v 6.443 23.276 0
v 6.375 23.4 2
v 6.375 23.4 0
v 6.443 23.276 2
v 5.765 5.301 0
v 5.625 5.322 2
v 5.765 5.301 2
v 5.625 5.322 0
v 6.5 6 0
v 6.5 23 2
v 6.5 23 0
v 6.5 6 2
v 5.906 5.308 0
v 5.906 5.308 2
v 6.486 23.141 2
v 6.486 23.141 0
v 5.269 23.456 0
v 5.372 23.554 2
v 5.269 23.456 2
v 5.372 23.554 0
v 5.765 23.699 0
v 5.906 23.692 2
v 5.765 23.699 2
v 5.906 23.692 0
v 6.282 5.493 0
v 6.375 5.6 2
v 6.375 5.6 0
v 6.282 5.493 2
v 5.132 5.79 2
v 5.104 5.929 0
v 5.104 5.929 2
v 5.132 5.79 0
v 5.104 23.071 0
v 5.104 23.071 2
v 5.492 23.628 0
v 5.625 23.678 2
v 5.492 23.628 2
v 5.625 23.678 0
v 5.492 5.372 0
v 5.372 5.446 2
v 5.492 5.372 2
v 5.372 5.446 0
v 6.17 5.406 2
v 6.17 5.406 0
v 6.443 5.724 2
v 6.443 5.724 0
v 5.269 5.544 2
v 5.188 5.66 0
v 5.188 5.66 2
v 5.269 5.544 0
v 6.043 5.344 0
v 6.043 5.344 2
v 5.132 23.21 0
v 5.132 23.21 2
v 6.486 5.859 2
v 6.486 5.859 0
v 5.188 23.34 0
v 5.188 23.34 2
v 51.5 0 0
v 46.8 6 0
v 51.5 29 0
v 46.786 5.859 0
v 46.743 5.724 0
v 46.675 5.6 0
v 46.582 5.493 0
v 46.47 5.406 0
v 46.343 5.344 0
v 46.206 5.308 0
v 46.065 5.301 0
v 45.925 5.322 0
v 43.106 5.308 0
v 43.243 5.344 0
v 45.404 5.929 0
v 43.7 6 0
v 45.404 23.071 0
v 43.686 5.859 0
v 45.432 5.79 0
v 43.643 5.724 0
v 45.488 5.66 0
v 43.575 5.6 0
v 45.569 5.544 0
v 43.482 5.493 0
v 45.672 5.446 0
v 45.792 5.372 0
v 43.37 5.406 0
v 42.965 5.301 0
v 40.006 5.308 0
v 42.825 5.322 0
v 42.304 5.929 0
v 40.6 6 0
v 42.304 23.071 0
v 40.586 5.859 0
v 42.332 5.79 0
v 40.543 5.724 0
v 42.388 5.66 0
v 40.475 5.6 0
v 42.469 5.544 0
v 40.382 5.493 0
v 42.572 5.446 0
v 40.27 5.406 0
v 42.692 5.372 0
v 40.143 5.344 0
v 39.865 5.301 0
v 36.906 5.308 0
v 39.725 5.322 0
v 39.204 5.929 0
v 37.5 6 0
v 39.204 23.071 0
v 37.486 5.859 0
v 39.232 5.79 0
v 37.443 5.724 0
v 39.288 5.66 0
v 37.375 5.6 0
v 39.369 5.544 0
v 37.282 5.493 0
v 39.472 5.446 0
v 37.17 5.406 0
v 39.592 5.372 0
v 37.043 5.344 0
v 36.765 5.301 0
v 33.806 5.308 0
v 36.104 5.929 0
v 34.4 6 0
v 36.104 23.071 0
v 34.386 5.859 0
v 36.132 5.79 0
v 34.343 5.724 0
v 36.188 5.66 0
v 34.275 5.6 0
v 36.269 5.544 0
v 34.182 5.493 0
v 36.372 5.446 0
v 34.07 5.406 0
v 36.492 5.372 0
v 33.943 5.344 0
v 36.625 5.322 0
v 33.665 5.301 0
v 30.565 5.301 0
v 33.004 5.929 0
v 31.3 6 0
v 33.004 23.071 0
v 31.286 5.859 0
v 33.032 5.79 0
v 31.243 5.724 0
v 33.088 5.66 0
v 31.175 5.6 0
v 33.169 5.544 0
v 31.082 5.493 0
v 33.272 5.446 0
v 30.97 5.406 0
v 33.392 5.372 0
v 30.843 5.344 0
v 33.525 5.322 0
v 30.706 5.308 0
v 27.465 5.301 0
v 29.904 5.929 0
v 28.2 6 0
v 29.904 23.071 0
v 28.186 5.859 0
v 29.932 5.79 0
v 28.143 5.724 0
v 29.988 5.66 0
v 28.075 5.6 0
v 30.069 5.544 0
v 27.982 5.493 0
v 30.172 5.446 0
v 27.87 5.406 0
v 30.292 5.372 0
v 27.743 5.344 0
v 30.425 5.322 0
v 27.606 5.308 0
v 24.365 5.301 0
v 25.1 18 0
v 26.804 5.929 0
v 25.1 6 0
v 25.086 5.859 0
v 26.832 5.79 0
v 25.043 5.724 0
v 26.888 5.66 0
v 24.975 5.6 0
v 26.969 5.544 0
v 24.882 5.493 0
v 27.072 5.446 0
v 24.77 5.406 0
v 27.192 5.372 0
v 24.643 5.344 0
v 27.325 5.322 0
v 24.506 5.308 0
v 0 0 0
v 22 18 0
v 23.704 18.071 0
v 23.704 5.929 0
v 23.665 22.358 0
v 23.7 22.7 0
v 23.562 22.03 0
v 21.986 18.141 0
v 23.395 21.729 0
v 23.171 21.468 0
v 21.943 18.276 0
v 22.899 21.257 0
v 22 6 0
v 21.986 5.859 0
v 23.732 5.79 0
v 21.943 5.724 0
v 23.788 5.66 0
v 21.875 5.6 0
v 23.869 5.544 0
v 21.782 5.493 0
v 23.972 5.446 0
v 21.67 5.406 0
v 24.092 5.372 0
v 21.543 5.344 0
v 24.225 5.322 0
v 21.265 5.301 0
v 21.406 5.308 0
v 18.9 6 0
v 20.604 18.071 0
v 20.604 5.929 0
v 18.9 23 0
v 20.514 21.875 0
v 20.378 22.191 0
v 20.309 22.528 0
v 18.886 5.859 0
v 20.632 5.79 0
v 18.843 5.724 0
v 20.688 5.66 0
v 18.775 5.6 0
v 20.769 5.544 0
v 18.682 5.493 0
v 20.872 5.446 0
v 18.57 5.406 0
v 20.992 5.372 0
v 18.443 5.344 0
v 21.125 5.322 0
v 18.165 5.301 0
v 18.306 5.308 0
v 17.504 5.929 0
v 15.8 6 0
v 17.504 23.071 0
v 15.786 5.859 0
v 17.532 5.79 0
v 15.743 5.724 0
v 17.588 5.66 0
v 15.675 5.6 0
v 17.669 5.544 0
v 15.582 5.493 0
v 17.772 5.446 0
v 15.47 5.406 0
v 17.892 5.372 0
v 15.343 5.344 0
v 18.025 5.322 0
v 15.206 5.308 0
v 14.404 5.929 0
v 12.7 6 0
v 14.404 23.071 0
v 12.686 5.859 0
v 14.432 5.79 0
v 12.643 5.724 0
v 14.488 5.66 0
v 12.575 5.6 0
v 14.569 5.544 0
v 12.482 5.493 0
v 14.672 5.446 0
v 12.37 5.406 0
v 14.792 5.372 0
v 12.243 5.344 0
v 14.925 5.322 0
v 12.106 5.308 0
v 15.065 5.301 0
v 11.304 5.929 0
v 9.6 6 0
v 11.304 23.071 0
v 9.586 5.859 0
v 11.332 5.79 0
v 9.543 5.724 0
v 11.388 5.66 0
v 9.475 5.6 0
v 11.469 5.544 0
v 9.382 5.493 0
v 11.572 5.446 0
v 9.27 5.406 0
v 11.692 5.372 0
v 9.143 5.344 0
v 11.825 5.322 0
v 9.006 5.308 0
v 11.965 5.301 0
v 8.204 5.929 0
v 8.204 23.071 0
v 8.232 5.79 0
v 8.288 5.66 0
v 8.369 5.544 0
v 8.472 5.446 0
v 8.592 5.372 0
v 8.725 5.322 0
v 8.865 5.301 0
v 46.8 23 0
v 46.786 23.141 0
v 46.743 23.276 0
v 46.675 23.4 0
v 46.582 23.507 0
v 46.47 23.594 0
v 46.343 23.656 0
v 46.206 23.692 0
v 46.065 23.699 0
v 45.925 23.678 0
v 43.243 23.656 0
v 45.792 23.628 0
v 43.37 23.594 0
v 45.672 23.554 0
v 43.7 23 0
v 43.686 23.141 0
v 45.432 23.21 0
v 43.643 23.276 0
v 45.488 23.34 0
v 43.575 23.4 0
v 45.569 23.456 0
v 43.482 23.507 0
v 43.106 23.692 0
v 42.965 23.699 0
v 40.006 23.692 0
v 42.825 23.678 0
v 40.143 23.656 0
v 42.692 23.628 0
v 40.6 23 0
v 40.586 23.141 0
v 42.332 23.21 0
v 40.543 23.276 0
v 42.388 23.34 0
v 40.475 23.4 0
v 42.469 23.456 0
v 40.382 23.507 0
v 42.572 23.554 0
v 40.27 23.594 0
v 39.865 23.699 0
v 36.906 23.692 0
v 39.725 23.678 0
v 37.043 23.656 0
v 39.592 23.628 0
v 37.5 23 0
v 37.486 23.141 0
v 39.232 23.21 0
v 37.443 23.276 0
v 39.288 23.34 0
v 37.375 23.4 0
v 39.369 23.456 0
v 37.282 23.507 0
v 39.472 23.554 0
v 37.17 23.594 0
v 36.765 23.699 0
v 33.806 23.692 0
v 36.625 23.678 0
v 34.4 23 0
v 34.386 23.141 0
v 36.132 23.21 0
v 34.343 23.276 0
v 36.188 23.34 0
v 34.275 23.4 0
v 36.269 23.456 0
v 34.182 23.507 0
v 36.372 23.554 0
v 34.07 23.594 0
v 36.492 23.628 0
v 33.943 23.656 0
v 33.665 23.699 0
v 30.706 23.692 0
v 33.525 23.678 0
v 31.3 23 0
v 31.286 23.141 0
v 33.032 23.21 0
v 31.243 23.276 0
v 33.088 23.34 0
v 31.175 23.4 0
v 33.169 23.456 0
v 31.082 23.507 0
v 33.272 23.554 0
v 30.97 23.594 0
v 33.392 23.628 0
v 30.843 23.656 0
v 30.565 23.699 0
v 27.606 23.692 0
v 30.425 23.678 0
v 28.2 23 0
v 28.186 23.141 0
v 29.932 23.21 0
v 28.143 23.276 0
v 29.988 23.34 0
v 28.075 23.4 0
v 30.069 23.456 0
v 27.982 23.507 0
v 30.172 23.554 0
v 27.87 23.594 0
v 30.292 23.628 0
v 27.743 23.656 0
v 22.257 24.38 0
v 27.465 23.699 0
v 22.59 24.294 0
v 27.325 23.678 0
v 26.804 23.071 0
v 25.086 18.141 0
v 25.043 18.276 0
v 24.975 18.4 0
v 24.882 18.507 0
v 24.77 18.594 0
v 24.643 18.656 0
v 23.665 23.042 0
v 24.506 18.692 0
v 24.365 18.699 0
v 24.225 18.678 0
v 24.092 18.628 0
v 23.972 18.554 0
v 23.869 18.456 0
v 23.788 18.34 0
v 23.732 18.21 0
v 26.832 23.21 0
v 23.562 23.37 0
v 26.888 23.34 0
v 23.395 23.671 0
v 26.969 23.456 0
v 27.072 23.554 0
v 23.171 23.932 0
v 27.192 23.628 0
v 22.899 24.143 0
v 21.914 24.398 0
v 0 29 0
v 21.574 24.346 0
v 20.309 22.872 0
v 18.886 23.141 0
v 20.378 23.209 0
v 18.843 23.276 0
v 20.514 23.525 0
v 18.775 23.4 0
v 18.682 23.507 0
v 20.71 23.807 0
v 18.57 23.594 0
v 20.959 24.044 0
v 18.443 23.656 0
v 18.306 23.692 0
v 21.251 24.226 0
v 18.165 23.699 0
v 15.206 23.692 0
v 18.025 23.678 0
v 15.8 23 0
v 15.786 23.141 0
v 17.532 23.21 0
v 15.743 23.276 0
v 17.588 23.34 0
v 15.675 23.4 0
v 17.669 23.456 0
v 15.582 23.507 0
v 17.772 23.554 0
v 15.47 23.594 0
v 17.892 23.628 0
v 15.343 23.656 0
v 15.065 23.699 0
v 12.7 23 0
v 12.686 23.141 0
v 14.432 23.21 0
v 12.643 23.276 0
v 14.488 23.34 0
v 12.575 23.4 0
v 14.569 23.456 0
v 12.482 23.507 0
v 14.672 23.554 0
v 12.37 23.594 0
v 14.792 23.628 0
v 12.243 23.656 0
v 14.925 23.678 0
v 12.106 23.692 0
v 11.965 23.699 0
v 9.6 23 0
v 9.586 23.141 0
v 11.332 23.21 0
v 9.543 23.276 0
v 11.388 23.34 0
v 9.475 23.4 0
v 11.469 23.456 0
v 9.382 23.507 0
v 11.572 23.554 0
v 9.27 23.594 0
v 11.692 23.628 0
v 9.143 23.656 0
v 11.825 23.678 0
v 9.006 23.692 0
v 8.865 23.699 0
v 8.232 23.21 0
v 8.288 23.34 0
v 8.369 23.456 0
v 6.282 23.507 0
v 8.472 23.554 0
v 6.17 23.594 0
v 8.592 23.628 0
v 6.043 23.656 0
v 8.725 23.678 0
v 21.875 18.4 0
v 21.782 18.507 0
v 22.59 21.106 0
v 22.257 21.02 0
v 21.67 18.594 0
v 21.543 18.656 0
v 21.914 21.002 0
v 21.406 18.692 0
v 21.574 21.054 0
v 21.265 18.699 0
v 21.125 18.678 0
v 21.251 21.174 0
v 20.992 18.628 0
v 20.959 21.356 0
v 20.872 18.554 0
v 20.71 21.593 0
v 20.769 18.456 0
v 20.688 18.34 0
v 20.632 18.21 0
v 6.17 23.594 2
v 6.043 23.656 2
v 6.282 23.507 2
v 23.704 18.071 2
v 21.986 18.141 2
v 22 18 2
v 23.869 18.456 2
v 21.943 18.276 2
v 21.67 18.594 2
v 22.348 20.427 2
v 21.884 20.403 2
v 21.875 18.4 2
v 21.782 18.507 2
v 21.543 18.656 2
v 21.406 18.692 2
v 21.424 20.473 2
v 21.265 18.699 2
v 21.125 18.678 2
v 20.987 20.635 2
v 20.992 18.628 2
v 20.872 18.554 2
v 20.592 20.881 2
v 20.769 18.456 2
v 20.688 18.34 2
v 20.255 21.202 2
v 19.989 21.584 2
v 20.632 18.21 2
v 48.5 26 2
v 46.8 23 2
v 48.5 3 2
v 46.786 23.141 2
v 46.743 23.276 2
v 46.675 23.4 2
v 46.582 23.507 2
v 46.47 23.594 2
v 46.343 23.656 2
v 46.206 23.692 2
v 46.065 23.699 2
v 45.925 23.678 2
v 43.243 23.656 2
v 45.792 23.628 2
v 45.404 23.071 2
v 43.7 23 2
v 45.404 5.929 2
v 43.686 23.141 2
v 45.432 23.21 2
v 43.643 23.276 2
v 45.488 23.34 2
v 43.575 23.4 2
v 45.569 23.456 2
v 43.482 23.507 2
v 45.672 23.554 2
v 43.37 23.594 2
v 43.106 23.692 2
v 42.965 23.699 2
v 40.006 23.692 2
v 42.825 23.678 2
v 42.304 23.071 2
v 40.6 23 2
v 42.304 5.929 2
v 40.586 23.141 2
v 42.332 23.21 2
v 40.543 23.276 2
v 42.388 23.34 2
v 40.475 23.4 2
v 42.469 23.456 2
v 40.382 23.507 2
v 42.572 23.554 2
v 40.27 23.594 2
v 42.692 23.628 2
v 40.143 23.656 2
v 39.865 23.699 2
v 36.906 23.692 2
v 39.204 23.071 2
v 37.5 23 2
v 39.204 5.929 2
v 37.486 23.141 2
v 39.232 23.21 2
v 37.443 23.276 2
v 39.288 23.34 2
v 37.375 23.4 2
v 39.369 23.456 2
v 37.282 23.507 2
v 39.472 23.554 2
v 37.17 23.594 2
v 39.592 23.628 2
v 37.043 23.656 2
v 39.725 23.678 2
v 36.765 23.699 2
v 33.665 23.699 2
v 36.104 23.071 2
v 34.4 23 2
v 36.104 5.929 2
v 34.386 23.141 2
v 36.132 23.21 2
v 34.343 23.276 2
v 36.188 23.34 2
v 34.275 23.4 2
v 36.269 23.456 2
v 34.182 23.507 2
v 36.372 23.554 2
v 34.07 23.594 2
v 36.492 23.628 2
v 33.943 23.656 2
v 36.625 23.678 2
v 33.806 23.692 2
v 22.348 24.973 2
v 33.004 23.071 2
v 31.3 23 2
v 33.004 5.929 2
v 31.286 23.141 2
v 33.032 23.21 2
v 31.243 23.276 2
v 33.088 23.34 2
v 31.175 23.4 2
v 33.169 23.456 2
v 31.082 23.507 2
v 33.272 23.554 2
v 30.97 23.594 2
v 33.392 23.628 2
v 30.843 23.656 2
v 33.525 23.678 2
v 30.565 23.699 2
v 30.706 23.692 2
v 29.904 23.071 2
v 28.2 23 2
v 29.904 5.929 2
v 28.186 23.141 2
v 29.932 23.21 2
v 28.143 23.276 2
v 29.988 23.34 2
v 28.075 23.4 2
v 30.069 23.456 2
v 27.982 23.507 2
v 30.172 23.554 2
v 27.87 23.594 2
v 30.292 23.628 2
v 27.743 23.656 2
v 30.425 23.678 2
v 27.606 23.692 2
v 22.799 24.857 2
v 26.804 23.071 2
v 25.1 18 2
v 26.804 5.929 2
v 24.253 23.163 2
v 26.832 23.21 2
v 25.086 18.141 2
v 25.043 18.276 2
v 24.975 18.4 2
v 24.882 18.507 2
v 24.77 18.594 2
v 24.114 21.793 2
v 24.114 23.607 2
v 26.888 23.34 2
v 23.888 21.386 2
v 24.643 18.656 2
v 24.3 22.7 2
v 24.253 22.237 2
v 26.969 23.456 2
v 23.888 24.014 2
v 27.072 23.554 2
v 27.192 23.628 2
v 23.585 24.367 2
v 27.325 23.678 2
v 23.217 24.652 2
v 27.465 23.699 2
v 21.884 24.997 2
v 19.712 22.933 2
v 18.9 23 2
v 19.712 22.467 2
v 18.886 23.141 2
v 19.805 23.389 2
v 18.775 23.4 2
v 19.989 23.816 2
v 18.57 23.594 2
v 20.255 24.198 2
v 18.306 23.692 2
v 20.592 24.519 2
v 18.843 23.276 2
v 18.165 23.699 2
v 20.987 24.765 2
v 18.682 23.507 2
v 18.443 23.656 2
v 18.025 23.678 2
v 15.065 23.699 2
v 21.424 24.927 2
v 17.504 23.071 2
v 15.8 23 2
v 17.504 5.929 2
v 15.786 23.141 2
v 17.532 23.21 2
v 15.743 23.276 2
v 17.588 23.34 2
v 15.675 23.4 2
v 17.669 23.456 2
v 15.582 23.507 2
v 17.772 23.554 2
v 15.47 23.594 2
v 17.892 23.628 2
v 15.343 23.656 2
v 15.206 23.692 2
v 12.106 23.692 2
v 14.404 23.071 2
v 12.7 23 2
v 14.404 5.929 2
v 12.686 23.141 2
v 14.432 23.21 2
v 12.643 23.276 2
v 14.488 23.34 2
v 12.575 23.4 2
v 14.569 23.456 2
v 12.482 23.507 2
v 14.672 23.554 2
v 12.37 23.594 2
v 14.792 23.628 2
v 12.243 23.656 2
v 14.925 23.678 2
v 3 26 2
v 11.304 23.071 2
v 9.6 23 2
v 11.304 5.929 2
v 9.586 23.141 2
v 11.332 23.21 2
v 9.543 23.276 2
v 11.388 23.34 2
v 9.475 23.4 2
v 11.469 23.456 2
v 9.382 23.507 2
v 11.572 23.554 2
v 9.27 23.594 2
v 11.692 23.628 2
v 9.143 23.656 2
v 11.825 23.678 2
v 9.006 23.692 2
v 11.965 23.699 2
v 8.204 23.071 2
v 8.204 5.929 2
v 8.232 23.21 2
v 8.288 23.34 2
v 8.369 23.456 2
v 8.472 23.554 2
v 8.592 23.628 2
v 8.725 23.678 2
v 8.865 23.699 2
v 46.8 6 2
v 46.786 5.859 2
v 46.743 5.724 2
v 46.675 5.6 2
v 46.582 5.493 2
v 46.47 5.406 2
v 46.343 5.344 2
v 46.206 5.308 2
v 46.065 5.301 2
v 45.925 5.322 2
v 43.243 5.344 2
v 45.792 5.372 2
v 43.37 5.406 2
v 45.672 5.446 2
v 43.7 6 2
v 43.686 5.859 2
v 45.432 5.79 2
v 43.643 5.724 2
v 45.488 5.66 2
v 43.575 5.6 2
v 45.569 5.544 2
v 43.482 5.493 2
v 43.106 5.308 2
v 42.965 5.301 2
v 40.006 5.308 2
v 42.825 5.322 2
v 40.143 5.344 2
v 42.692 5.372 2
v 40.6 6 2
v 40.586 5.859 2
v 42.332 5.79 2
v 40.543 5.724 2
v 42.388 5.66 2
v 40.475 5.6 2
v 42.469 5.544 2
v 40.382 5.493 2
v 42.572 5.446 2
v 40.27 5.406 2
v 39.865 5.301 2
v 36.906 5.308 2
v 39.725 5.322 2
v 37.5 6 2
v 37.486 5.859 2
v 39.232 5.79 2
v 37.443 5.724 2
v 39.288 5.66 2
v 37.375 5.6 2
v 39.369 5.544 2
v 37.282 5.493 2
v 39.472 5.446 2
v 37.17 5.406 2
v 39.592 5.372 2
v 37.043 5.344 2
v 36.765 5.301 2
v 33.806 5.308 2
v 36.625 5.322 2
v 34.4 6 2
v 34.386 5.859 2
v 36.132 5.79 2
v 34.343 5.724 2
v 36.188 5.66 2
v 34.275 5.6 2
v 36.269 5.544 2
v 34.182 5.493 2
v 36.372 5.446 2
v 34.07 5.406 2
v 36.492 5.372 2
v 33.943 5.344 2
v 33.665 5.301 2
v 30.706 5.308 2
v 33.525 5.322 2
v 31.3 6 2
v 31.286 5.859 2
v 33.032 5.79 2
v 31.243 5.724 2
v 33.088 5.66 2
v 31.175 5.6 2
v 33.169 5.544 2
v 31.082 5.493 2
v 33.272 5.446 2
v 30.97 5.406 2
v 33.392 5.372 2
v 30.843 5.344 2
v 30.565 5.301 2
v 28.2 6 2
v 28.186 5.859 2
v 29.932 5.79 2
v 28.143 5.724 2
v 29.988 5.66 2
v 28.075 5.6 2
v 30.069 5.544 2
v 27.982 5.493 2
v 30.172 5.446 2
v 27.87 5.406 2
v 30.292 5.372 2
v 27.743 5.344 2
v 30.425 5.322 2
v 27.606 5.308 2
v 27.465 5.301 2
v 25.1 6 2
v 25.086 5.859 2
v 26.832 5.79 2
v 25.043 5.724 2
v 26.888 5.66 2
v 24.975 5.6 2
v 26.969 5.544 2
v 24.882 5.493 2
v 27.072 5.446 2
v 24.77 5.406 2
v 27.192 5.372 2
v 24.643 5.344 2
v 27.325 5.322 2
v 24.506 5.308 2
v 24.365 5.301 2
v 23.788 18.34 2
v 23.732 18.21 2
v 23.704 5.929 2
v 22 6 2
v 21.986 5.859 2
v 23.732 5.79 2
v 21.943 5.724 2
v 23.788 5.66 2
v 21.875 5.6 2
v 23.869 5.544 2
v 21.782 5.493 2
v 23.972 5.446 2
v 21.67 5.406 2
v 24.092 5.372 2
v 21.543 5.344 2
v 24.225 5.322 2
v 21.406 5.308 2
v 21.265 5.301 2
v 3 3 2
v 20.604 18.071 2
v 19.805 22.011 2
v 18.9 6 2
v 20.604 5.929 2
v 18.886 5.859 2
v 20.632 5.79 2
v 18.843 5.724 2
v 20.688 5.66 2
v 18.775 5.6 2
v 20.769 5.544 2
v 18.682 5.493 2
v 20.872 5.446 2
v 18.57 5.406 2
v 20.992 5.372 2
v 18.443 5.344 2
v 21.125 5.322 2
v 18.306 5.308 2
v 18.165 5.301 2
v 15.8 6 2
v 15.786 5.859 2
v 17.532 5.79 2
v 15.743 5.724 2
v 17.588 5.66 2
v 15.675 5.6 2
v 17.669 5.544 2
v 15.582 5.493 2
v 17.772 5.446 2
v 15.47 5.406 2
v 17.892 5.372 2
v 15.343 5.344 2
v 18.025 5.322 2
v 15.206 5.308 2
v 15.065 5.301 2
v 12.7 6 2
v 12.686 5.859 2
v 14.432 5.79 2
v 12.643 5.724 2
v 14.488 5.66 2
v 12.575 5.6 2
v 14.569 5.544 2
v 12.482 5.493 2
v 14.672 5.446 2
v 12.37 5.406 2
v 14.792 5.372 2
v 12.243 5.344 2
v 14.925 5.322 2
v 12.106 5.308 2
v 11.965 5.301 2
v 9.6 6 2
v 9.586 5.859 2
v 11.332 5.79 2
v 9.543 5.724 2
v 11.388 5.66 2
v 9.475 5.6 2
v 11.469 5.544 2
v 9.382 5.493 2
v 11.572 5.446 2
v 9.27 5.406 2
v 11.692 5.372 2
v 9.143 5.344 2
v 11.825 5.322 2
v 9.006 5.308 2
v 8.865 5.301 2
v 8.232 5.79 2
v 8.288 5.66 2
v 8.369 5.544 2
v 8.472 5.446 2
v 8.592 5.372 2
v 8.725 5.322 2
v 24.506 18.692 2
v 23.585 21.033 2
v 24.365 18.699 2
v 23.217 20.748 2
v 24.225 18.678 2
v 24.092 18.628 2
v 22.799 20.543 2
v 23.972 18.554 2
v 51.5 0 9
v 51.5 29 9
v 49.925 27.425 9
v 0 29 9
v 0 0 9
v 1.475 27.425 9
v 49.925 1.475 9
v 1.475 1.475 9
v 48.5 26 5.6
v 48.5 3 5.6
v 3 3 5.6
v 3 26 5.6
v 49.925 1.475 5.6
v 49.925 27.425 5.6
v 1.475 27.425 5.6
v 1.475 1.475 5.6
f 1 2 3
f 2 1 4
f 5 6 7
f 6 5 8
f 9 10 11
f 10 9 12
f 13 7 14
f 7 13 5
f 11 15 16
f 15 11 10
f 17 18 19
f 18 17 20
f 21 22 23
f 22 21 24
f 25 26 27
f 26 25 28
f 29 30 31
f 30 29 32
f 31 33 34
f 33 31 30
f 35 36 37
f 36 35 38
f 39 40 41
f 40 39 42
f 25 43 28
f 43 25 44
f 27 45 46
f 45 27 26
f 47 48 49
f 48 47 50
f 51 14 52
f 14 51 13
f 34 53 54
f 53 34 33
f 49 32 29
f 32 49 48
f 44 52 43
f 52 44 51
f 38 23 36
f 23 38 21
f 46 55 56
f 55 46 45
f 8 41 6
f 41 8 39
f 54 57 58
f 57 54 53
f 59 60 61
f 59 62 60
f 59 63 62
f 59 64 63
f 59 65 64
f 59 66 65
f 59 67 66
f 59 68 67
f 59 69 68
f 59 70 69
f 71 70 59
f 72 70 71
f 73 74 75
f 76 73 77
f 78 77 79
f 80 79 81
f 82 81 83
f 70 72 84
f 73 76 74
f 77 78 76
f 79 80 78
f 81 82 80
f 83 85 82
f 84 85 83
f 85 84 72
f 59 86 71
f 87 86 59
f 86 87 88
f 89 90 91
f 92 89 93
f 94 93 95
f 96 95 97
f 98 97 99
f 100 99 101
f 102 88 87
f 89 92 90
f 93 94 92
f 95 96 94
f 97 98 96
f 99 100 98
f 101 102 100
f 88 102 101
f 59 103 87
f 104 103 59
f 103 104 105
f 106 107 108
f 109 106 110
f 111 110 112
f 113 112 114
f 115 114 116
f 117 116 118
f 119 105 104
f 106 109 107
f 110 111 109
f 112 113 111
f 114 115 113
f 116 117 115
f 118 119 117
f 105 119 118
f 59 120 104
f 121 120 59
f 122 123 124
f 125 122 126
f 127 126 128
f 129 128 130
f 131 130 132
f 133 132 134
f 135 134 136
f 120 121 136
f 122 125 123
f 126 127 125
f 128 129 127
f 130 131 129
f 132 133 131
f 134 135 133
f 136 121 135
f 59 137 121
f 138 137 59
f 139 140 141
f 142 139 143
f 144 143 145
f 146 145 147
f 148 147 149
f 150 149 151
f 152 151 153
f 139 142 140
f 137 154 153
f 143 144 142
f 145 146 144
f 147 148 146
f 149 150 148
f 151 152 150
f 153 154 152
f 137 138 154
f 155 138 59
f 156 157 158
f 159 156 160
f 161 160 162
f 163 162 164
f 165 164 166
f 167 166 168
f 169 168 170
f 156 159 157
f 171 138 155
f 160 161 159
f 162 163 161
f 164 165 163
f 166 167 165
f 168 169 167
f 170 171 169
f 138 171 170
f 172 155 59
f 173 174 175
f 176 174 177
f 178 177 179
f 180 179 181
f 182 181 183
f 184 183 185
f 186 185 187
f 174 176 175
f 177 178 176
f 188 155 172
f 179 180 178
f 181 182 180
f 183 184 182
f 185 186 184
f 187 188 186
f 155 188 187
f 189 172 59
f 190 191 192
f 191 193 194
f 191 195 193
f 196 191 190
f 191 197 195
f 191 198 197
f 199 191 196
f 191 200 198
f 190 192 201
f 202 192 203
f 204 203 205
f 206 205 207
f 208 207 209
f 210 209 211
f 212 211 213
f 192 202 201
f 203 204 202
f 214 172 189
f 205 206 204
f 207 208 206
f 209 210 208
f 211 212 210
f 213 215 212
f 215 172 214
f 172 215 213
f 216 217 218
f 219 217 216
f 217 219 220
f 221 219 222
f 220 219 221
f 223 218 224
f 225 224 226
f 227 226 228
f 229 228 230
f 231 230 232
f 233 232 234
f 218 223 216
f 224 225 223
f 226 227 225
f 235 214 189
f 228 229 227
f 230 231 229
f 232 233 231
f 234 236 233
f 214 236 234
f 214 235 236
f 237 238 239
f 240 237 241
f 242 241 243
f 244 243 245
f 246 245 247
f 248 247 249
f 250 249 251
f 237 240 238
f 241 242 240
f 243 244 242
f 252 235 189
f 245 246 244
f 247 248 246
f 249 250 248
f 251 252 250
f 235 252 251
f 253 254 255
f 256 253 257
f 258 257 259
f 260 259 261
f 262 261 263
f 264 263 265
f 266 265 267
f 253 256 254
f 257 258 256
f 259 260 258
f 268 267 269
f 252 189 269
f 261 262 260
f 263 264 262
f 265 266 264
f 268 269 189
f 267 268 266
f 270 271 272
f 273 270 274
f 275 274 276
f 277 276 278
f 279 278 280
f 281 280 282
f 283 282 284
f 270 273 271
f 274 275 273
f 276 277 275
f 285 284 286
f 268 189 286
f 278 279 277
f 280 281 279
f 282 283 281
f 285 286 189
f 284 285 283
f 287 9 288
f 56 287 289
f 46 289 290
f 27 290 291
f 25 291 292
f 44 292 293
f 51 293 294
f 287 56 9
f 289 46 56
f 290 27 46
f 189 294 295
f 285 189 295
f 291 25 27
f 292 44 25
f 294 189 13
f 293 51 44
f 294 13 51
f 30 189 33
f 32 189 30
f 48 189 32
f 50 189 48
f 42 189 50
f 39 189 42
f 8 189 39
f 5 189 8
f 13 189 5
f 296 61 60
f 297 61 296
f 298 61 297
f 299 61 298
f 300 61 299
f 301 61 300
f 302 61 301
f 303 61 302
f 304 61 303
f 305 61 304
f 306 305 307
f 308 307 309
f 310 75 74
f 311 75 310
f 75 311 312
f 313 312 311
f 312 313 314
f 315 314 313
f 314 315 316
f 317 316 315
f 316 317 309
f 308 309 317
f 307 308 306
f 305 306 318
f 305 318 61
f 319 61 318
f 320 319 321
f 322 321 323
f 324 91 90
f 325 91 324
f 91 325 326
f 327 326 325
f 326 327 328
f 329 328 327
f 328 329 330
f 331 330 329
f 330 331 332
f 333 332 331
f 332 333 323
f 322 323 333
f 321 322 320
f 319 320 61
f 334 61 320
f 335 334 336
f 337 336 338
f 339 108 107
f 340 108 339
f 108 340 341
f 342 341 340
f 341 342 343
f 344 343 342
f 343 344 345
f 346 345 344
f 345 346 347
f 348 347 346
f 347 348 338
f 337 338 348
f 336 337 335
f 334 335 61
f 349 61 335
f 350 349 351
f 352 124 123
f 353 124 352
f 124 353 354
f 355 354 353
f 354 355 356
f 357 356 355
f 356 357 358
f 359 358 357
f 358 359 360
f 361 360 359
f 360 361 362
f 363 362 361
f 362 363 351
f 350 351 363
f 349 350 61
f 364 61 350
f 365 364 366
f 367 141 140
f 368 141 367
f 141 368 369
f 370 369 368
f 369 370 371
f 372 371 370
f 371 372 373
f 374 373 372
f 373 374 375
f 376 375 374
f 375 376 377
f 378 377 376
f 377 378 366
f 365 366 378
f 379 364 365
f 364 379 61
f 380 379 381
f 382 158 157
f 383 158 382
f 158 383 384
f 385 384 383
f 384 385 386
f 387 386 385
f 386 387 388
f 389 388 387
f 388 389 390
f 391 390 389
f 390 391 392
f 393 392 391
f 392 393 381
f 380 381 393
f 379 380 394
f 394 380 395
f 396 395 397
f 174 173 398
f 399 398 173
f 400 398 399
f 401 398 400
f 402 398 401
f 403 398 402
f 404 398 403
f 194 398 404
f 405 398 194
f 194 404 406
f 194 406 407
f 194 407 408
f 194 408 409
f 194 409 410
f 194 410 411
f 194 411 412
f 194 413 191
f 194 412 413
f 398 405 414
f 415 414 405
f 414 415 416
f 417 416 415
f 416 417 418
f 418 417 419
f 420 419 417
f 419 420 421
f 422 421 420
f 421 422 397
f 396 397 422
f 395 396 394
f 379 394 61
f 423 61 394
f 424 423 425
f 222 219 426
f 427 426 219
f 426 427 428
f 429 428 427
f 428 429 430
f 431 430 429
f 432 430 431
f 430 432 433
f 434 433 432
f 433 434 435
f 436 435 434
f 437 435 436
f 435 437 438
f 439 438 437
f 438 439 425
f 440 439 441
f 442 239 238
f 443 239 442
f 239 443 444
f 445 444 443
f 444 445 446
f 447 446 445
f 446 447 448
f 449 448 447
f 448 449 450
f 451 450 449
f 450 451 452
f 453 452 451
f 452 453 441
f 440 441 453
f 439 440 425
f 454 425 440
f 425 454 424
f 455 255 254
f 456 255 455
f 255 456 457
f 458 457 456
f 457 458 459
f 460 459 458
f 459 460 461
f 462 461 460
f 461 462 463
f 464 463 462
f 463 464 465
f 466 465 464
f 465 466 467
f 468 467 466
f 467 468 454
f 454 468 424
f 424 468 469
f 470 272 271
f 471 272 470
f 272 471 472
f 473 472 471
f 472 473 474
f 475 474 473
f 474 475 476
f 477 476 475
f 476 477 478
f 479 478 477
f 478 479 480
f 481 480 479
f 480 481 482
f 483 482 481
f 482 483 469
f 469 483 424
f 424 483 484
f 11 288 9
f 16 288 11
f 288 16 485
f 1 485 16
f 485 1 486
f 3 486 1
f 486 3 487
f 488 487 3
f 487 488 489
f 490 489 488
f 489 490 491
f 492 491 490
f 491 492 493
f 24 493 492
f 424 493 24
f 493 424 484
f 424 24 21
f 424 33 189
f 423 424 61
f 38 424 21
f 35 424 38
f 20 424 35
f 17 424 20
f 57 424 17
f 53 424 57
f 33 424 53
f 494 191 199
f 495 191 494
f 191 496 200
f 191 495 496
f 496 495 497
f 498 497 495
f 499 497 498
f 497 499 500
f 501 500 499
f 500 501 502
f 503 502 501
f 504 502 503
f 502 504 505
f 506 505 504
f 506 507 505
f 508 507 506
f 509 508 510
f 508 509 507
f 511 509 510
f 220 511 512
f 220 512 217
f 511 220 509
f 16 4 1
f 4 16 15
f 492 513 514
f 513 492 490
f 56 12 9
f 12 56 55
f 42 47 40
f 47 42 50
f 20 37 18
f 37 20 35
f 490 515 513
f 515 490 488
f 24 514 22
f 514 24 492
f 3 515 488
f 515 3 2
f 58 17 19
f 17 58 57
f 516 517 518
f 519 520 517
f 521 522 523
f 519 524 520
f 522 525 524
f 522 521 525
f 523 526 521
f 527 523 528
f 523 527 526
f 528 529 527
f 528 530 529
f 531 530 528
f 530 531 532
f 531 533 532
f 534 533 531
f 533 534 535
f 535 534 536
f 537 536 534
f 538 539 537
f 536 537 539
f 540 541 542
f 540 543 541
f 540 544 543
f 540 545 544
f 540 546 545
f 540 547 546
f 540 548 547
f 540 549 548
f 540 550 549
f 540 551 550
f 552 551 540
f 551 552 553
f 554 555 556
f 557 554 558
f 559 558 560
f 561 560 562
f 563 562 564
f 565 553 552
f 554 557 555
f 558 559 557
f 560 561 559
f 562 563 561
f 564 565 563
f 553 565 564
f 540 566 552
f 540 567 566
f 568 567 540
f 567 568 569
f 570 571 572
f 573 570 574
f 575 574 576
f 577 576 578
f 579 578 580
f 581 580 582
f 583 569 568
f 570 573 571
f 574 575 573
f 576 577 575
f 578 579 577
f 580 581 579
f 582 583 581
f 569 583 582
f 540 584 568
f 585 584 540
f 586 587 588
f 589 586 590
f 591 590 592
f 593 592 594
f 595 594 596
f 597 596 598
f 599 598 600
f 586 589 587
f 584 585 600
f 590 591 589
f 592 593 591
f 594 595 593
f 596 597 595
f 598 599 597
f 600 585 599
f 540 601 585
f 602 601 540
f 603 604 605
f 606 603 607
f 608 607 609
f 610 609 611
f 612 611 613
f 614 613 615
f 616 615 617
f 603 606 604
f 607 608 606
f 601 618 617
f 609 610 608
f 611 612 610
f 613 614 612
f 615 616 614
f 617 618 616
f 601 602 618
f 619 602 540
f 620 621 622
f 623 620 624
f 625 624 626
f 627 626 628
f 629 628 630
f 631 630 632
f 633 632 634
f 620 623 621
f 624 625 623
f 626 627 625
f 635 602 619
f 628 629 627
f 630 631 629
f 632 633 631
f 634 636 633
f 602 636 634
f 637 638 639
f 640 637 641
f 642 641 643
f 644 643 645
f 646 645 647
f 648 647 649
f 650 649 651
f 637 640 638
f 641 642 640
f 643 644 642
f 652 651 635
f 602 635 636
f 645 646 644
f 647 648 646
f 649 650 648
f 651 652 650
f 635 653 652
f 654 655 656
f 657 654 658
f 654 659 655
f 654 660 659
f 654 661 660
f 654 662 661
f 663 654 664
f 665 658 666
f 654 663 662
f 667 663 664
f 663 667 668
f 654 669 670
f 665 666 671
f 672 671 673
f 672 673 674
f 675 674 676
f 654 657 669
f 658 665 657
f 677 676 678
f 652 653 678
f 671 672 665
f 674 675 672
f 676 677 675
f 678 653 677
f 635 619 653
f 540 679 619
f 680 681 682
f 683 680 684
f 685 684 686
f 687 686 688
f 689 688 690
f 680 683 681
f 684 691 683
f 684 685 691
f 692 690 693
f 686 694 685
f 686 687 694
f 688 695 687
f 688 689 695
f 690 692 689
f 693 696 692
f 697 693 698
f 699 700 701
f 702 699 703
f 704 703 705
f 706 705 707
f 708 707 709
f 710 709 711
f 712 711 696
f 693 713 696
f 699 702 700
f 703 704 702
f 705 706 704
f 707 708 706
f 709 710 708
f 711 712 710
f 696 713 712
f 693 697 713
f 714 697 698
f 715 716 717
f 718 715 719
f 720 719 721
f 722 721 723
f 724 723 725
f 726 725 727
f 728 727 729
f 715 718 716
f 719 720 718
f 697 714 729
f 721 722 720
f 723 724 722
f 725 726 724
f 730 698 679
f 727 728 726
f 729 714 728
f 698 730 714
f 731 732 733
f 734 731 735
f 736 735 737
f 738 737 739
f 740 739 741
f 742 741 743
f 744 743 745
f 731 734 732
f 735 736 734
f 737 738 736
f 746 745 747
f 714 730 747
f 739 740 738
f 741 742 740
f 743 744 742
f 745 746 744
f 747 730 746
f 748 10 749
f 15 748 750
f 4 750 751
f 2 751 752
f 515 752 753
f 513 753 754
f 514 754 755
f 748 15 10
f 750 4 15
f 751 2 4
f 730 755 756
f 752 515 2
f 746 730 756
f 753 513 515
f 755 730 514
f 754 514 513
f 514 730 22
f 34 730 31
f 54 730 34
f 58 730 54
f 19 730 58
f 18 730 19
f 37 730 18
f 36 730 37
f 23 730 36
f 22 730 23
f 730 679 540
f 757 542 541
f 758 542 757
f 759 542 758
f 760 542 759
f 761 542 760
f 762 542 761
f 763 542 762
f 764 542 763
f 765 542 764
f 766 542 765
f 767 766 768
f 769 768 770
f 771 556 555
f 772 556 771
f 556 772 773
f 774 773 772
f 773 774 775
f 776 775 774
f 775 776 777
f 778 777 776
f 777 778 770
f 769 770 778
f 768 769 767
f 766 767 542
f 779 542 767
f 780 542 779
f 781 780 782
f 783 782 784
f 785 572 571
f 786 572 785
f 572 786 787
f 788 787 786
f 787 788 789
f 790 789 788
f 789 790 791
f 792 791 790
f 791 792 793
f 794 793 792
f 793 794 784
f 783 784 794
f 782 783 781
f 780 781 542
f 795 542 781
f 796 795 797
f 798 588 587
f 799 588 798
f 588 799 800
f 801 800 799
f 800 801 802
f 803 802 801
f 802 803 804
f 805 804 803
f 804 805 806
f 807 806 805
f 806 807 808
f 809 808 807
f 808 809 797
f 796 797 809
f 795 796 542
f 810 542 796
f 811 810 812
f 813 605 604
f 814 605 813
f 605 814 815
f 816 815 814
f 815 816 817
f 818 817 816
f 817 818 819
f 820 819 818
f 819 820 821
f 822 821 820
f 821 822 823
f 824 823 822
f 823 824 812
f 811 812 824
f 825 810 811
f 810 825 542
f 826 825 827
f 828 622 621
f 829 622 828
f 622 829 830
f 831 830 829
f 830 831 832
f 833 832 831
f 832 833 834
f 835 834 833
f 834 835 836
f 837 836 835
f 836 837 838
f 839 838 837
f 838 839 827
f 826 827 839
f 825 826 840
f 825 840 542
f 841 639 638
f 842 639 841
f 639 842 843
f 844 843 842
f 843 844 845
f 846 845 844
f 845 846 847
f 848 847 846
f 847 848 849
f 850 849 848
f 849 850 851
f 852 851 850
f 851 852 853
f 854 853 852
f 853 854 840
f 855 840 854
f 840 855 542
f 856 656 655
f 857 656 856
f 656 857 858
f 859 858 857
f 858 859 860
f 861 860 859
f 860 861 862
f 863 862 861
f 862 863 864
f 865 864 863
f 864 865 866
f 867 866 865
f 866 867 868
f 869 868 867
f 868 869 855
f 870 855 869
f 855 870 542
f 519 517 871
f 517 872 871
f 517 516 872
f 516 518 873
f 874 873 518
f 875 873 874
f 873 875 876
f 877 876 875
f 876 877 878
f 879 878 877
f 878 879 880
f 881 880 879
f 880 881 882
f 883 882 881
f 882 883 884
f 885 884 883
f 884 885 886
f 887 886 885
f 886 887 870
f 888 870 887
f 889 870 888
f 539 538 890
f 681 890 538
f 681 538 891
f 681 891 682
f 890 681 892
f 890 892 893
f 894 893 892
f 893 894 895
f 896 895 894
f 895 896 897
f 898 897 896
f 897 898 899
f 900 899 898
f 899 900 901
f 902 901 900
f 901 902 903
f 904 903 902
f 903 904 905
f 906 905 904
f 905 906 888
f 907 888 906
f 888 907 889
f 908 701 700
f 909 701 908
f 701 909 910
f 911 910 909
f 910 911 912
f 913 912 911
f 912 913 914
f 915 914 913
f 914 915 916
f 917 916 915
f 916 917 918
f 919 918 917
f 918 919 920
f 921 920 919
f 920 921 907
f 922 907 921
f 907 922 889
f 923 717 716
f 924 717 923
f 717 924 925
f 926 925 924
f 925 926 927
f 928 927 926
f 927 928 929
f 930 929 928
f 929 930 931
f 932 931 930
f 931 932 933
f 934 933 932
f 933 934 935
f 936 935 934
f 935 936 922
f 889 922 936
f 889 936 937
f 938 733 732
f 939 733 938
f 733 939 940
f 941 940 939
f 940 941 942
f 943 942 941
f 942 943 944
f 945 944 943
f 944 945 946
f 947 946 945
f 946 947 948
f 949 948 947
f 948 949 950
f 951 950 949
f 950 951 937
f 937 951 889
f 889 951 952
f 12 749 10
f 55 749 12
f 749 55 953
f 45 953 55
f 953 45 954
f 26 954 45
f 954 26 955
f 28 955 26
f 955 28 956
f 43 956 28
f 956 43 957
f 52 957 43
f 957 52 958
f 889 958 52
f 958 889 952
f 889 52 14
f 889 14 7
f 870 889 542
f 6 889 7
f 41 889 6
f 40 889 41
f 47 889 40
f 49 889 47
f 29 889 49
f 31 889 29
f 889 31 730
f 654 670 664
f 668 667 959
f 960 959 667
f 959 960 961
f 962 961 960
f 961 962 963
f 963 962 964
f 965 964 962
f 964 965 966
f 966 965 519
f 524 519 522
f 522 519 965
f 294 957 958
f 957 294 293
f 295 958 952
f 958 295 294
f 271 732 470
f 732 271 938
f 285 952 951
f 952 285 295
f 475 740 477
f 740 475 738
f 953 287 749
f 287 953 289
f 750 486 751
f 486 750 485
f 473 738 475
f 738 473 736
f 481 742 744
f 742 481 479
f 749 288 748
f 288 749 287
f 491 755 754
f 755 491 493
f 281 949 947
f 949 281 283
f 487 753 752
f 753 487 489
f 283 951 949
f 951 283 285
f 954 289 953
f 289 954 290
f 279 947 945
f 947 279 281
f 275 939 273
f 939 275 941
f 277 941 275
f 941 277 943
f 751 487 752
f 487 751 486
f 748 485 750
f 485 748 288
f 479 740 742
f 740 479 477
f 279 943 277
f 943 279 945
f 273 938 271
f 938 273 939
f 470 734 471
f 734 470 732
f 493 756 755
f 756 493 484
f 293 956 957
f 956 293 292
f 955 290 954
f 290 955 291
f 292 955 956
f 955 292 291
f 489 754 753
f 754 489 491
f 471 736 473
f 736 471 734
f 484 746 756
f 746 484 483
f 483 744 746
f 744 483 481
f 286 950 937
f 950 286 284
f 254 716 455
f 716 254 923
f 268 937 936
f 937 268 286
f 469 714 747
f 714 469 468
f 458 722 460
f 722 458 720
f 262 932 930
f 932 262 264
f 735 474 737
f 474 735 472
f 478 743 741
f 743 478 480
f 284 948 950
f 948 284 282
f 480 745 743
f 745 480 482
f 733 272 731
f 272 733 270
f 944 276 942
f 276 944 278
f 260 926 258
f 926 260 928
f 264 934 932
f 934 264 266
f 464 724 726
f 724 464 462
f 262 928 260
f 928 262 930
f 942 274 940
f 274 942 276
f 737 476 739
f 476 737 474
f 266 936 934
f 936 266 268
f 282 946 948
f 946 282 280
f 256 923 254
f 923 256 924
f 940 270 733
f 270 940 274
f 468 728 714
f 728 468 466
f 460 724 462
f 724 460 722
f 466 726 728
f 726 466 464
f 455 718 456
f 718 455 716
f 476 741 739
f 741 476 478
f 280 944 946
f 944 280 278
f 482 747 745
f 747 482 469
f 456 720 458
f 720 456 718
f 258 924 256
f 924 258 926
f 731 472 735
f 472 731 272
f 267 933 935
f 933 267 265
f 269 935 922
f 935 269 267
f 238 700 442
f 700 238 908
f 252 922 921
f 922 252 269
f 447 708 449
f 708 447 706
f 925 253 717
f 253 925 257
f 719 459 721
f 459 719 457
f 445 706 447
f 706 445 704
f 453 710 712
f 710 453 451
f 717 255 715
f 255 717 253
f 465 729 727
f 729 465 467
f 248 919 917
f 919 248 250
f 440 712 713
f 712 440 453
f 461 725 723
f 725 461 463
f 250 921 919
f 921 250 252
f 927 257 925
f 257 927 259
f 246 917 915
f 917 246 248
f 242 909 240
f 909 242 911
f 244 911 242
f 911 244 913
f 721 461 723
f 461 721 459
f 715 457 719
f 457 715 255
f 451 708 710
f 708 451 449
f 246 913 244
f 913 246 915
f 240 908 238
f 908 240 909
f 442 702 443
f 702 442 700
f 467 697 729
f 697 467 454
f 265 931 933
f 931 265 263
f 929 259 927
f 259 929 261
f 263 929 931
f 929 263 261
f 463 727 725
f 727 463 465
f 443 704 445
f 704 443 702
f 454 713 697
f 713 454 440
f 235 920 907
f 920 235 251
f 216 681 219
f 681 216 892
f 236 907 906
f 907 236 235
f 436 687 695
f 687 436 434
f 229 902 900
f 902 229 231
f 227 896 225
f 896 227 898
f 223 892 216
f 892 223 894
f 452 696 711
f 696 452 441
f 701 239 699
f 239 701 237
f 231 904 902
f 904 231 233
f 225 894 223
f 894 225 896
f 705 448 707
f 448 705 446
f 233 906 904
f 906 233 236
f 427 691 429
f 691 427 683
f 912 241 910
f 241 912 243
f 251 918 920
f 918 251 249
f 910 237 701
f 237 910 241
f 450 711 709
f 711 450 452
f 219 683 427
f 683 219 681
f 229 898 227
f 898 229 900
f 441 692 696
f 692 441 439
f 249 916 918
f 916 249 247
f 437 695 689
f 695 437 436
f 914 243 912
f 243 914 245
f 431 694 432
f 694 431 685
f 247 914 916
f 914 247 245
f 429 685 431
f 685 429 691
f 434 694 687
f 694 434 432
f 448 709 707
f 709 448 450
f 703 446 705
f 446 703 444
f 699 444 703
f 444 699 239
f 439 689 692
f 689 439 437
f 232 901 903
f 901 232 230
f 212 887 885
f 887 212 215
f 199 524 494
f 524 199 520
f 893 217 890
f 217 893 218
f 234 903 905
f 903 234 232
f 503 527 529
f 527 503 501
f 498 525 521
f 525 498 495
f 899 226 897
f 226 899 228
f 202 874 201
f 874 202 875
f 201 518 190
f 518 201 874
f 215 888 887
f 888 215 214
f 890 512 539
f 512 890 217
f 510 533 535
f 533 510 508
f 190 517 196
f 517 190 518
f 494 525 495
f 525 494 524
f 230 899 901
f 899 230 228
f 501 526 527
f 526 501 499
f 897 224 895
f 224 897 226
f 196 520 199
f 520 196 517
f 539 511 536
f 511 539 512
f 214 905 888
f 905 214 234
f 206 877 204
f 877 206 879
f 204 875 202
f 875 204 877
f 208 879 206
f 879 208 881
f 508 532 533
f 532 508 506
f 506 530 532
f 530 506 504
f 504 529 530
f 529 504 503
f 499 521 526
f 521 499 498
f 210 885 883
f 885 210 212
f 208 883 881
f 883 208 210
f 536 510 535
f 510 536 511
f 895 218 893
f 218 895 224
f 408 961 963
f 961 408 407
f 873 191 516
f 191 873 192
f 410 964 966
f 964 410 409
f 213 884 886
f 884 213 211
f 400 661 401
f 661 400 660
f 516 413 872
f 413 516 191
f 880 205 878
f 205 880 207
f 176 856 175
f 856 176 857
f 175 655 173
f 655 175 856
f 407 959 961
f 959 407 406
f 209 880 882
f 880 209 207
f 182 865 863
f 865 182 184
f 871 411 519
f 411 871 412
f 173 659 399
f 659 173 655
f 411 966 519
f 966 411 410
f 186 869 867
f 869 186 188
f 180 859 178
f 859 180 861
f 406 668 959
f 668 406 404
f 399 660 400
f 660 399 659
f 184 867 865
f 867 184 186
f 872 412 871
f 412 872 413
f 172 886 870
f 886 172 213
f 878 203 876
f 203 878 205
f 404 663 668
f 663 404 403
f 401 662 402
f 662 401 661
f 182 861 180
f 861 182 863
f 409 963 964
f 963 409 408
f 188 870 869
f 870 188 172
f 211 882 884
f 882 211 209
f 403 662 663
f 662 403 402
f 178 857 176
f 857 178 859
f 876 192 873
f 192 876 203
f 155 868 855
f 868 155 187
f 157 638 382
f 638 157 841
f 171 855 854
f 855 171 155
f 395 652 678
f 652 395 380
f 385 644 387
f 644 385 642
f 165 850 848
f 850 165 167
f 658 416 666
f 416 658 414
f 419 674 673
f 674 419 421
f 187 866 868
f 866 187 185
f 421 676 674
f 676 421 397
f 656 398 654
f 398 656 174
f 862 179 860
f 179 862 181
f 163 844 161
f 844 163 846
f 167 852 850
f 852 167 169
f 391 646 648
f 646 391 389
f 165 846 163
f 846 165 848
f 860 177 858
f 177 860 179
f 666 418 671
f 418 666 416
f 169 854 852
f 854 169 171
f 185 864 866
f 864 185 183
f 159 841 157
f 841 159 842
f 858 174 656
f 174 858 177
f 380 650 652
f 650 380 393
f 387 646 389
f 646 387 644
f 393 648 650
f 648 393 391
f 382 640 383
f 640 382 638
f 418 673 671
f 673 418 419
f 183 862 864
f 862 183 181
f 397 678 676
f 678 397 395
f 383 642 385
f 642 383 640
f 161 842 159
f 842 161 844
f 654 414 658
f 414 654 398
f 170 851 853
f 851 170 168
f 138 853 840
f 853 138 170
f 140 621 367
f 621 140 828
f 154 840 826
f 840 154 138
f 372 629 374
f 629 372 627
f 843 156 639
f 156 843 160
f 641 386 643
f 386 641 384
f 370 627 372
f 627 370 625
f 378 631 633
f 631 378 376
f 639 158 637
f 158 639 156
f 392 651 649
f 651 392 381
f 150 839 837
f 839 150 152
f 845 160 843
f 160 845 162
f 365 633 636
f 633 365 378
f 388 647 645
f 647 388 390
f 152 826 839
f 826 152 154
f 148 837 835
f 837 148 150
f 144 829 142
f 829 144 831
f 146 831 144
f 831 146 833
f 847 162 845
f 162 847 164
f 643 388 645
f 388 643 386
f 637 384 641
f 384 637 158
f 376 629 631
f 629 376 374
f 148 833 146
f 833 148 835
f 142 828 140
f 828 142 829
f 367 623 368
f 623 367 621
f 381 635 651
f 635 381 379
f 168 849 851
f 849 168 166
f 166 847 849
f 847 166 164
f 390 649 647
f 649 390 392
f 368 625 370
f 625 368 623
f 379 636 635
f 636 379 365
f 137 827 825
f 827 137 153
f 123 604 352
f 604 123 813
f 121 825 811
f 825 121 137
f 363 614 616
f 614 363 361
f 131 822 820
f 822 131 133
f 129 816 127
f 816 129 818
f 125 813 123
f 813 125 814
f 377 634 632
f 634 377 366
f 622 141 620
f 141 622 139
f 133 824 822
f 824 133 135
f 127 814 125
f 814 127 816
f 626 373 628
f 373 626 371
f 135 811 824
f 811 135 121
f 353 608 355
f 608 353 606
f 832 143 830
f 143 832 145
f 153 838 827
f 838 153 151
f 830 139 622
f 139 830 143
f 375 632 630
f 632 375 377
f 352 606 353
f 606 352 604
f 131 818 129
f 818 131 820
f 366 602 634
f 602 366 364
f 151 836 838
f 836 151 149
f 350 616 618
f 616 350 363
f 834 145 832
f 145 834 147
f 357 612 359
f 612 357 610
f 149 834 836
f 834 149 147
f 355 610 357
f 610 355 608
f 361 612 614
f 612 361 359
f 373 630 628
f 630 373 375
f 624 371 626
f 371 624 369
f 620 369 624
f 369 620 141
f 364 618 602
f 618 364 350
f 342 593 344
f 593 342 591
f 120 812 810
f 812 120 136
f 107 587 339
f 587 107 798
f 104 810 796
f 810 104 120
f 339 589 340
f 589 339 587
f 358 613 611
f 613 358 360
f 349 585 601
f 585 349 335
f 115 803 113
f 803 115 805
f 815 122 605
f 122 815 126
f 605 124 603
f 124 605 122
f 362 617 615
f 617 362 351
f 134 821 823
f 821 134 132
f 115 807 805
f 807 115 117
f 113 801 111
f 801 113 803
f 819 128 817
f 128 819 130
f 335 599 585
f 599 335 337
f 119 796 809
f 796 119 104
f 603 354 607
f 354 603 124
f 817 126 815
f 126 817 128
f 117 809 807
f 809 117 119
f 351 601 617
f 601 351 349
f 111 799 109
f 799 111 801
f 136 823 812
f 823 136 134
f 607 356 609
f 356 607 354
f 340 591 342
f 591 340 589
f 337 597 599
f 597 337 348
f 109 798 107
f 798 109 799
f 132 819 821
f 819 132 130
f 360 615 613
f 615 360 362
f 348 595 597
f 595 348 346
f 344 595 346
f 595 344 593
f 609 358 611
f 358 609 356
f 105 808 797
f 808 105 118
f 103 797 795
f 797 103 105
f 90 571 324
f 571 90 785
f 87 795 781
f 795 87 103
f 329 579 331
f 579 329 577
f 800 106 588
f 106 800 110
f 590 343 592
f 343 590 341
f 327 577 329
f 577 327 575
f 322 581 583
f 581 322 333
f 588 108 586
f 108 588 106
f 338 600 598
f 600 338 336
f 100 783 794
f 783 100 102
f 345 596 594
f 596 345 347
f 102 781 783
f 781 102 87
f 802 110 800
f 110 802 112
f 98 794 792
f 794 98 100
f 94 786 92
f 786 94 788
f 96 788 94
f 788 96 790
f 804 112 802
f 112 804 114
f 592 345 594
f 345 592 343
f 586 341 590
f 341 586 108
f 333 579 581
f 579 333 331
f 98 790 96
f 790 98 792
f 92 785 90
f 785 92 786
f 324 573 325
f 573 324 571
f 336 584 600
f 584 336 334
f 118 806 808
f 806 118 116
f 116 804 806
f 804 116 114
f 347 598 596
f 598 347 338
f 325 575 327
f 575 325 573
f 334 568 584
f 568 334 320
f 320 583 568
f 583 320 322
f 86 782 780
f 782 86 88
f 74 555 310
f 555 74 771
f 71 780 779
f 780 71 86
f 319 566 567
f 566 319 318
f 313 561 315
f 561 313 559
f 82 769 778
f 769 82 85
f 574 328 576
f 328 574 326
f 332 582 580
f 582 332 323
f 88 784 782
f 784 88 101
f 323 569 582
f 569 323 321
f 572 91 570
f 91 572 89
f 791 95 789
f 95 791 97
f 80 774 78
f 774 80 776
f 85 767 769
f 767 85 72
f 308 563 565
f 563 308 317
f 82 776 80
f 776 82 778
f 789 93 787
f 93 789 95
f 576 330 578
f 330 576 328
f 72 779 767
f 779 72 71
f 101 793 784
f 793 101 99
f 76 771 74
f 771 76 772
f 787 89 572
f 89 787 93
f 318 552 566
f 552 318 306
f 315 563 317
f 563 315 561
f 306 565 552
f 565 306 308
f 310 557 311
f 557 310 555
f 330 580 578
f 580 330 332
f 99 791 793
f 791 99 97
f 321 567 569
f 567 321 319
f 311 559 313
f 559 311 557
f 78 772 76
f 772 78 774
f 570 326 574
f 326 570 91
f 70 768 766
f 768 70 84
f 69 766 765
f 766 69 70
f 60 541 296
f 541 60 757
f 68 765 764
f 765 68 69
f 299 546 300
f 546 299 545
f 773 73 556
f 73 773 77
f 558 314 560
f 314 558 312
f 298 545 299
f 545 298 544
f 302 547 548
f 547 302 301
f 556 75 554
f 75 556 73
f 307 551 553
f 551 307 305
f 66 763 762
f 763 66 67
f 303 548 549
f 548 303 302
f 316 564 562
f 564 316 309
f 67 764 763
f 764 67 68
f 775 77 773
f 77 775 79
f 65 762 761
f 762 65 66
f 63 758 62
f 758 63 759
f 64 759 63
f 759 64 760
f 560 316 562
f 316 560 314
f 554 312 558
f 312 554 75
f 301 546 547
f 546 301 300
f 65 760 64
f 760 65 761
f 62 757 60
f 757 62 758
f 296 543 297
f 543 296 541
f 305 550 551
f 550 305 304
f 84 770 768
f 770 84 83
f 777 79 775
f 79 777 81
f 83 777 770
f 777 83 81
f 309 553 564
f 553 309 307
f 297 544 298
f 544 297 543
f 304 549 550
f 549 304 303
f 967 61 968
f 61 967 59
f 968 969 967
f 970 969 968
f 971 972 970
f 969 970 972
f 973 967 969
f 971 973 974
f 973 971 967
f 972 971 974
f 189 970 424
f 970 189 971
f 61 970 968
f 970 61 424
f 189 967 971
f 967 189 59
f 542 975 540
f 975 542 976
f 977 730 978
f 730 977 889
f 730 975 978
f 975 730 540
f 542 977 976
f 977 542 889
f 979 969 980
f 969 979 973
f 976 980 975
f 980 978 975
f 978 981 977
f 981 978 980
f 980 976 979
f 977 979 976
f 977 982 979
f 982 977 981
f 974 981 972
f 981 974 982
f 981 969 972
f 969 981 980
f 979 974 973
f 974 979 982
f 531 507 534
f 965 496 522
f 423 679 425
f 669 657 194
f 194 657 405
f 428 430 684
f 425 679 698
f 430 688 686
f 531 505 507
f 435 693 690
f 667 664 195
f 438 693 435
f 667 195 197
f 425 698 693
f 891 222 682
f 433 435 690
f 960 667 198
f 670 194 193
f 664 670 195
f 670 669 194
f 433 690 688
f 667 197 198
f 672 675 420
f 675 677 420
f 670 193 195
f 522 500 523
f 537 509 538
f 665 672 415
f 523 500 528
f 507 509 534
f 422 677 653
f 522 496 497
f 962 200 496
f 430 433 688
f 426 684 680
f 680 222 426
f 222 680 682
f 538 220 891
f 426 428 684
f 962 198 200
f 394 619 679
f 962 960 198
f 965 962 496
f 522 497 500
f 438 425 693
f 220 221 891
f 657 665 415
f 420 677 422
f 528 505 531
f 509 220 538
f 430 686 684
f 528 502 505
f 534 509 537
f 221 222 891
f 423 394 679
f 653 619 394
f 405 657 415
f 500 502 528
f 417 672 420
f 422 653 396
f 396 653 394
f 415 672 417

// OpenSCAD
// Boks LM2596-basert buck-converter

debug = true;
idiot = $preview ? .5 : 0;
fn = $preview ? 12 : 31;

board_x = 43.5;
board_y = 21;
ol_height = 3; // overlapp
b_height = 9;
t_height = 16-b_height; // bare skruen stikker ut
walls = 3;
gap = 1;
bottom = 3;
top = 2;
hole_r = 1.5;
lh_width = 4; // lead hole
lh_height = 5.5; // lead hole
fitness_x = .05;
fitness_z = .4;
pot_x = 9.5;
pot_y = 4.5;
pot_z = 1.5;
b_wedge = 1.15;
t_wedge = .01;
w_wedge = 2;

module bottom() {
    difference() {
        cube([board_x+walls*2+gap*2,board_y+walls*2+gap*2,b_height+bottom]);
        translate([walls,walls,bottom]) {
            cube([board_x+gap*2,board_y+gap*2,b_height+idiot]);
        }
        translate([0,0,bottom+b_height-ol_height]) {
            difference() {
                cube([board_x+walls*2+gap*2,board_y+walls*2+gap*2,ol_height]);
                translate([walls/2,walls/2,0]) {
                    cube([board_x+walls+gap*2,board_y+walls+gap*2,ol_height]);
                }
            }
        }
        translate([0,walls+gap,bottom-1]) {
            cube([walls+5,lh_width,lh_height+1]);
        }
        translate([0,walls+board_y-lh_width+gap,bottom-1]) {
            cube([walls+5,lh_width,lh_height+1]);
        }
        translate([walls+board_x+gap*2-5,walls+gap,bottom-1]) {
            cube([walls+5,lh_width,lh_height+1]);
        }
        translate([walls+board_x+gap*2-5,walls+board_y-lh_width+gap,bottom-1]) {
            cube([walls+5,lh_width,lh_height+1]);
        }
        translate([walls+gap+23.8,walls+board_y+gap-pot_y,bottom-pot_z]) {
            cube([pot_x,pot_y,pot_z]);
        }
    }
    translate([walls+board_x*.15,walls,bottom]) {
        hull() {
            cube([w_wedge,b_wedge,t_wedge]);
            translate([0,0,b_height]) {
                cube([w_wedge,t_wedge,t_wedge]);
            }
        }
    }
    translate([walls+board_x*.85-1,walls,bottom]) {
        hull() {
            cube([w_wedge,b_wedge,t_wedge]);
            translate([0,0,b_height]) {
                cube([w_wedge,t_wedge,t_wedge]);
            }
        }
    }
    translate([walls+board_x*.15,board_y+walls+gap*2-b_wedge,bottom]) {
        hull() {
            cube([w_wedge,b_wedge,t_wedge]);
            translate([0,b_wedge,b_height]) {
                cube([w_wedge,t_wedge,t_wedge]);
            }
        }
    }
    translate([walls+board_x*.85-1,board_y+walls+gap*2-b_wedge,bottom]) {
        hull() {
            cube([w_wedge,b_wedge,t_wedge]);
            translate([0,b_wedge,b_height]) {
                cube([w_wedge,t_wedge,t_wedge]);
            }
        }
    }
    translate([walls,board_y/2+walls-w_wedge/2,bottom]) {
        hull() {
            cube([b_wedge,w_wedge,t_wedge]);
            translate([0,b_wedge,b_height]) {
                cube([t_wedge,w_wedge,t_wedge]);
            }
        }
    }
    translate([walls+board_x+gap*2-b_wedge,board_y/2+walls-w_wedge/2,bottom]) {
        hull() {
            cube([b_wedge,w_wedge,t_wedge]);
            translate([b_wedge,0,b_height]) {
                cube([t_wedge,w_wedge,t_wedge]);
            }
        }
    }
}

module top() {
    difference() {
        cube([board_x+walls*2+gap*2,board_y+walls*2+gap*2,t_height+top]);
        translate([walls,walls,top]) {
            cube([board_x+gap*2,board_y+gap*2,t_height+idiot]);
        }
        translate([walls/2-fitness_x/2,walls/2-fitness_x/2,top+t_height-ol_height-fitness_z]) {
            cube([board_x+walls+gap*2-fitness_x,board_y+walls+gap*2-fitness_x,ol_height+fitness_z]);
        }
        translate([walls+gap+18,walls+board_y+gap-2.3,0]) {
            cylinder(d1=3.4, d2=4.6, h=top+idiot, $fn=fn);
        }
        //  for(variable = [start : increment : end])
        for (x=[walls*2-.2:3.1:board_x+walls]) {
            echo(x);
            translate([x,walls*2,0]) {
                hull() {
                    corr = (x > 20 && x < 26) ? -5 : 0;
                    cylinder(h=top, r=.7, $fn=fn);
                    translate([0,17+corr,0]) {
                        cylinder(h=top, r=.7, $fn=fn);
                    }
                }
            }
        }
    }
}
//bottom();
top();
/*
translate([0,-40,0]) {
    top();
}
*/    
/*
translate([(walls+walls/2+3), walls+walls/2+3,-idiot], $fn=fn) {
    cylinder(r=hole_r,h=bottom+idiot*2);
}
translate([board_x-(walls-walls/2-3),(walls+walls/2+3),-idiot], $fn=fn) {
    cylinder(r=hole_r,h=bottom+idiot*2);
}
translate([(walls+walls/2+3),board_y-(walls-3),-idiot], $fn=fn) {
    cylinder(r=hole_r,h=bottom+idiot*2);
}
translate([board_x-walls+3,board_y-(walls-3),-idiot], $fn=fn) {
    cylinder(r=hole_r,h=bottom+idiot*2);
}
*/
